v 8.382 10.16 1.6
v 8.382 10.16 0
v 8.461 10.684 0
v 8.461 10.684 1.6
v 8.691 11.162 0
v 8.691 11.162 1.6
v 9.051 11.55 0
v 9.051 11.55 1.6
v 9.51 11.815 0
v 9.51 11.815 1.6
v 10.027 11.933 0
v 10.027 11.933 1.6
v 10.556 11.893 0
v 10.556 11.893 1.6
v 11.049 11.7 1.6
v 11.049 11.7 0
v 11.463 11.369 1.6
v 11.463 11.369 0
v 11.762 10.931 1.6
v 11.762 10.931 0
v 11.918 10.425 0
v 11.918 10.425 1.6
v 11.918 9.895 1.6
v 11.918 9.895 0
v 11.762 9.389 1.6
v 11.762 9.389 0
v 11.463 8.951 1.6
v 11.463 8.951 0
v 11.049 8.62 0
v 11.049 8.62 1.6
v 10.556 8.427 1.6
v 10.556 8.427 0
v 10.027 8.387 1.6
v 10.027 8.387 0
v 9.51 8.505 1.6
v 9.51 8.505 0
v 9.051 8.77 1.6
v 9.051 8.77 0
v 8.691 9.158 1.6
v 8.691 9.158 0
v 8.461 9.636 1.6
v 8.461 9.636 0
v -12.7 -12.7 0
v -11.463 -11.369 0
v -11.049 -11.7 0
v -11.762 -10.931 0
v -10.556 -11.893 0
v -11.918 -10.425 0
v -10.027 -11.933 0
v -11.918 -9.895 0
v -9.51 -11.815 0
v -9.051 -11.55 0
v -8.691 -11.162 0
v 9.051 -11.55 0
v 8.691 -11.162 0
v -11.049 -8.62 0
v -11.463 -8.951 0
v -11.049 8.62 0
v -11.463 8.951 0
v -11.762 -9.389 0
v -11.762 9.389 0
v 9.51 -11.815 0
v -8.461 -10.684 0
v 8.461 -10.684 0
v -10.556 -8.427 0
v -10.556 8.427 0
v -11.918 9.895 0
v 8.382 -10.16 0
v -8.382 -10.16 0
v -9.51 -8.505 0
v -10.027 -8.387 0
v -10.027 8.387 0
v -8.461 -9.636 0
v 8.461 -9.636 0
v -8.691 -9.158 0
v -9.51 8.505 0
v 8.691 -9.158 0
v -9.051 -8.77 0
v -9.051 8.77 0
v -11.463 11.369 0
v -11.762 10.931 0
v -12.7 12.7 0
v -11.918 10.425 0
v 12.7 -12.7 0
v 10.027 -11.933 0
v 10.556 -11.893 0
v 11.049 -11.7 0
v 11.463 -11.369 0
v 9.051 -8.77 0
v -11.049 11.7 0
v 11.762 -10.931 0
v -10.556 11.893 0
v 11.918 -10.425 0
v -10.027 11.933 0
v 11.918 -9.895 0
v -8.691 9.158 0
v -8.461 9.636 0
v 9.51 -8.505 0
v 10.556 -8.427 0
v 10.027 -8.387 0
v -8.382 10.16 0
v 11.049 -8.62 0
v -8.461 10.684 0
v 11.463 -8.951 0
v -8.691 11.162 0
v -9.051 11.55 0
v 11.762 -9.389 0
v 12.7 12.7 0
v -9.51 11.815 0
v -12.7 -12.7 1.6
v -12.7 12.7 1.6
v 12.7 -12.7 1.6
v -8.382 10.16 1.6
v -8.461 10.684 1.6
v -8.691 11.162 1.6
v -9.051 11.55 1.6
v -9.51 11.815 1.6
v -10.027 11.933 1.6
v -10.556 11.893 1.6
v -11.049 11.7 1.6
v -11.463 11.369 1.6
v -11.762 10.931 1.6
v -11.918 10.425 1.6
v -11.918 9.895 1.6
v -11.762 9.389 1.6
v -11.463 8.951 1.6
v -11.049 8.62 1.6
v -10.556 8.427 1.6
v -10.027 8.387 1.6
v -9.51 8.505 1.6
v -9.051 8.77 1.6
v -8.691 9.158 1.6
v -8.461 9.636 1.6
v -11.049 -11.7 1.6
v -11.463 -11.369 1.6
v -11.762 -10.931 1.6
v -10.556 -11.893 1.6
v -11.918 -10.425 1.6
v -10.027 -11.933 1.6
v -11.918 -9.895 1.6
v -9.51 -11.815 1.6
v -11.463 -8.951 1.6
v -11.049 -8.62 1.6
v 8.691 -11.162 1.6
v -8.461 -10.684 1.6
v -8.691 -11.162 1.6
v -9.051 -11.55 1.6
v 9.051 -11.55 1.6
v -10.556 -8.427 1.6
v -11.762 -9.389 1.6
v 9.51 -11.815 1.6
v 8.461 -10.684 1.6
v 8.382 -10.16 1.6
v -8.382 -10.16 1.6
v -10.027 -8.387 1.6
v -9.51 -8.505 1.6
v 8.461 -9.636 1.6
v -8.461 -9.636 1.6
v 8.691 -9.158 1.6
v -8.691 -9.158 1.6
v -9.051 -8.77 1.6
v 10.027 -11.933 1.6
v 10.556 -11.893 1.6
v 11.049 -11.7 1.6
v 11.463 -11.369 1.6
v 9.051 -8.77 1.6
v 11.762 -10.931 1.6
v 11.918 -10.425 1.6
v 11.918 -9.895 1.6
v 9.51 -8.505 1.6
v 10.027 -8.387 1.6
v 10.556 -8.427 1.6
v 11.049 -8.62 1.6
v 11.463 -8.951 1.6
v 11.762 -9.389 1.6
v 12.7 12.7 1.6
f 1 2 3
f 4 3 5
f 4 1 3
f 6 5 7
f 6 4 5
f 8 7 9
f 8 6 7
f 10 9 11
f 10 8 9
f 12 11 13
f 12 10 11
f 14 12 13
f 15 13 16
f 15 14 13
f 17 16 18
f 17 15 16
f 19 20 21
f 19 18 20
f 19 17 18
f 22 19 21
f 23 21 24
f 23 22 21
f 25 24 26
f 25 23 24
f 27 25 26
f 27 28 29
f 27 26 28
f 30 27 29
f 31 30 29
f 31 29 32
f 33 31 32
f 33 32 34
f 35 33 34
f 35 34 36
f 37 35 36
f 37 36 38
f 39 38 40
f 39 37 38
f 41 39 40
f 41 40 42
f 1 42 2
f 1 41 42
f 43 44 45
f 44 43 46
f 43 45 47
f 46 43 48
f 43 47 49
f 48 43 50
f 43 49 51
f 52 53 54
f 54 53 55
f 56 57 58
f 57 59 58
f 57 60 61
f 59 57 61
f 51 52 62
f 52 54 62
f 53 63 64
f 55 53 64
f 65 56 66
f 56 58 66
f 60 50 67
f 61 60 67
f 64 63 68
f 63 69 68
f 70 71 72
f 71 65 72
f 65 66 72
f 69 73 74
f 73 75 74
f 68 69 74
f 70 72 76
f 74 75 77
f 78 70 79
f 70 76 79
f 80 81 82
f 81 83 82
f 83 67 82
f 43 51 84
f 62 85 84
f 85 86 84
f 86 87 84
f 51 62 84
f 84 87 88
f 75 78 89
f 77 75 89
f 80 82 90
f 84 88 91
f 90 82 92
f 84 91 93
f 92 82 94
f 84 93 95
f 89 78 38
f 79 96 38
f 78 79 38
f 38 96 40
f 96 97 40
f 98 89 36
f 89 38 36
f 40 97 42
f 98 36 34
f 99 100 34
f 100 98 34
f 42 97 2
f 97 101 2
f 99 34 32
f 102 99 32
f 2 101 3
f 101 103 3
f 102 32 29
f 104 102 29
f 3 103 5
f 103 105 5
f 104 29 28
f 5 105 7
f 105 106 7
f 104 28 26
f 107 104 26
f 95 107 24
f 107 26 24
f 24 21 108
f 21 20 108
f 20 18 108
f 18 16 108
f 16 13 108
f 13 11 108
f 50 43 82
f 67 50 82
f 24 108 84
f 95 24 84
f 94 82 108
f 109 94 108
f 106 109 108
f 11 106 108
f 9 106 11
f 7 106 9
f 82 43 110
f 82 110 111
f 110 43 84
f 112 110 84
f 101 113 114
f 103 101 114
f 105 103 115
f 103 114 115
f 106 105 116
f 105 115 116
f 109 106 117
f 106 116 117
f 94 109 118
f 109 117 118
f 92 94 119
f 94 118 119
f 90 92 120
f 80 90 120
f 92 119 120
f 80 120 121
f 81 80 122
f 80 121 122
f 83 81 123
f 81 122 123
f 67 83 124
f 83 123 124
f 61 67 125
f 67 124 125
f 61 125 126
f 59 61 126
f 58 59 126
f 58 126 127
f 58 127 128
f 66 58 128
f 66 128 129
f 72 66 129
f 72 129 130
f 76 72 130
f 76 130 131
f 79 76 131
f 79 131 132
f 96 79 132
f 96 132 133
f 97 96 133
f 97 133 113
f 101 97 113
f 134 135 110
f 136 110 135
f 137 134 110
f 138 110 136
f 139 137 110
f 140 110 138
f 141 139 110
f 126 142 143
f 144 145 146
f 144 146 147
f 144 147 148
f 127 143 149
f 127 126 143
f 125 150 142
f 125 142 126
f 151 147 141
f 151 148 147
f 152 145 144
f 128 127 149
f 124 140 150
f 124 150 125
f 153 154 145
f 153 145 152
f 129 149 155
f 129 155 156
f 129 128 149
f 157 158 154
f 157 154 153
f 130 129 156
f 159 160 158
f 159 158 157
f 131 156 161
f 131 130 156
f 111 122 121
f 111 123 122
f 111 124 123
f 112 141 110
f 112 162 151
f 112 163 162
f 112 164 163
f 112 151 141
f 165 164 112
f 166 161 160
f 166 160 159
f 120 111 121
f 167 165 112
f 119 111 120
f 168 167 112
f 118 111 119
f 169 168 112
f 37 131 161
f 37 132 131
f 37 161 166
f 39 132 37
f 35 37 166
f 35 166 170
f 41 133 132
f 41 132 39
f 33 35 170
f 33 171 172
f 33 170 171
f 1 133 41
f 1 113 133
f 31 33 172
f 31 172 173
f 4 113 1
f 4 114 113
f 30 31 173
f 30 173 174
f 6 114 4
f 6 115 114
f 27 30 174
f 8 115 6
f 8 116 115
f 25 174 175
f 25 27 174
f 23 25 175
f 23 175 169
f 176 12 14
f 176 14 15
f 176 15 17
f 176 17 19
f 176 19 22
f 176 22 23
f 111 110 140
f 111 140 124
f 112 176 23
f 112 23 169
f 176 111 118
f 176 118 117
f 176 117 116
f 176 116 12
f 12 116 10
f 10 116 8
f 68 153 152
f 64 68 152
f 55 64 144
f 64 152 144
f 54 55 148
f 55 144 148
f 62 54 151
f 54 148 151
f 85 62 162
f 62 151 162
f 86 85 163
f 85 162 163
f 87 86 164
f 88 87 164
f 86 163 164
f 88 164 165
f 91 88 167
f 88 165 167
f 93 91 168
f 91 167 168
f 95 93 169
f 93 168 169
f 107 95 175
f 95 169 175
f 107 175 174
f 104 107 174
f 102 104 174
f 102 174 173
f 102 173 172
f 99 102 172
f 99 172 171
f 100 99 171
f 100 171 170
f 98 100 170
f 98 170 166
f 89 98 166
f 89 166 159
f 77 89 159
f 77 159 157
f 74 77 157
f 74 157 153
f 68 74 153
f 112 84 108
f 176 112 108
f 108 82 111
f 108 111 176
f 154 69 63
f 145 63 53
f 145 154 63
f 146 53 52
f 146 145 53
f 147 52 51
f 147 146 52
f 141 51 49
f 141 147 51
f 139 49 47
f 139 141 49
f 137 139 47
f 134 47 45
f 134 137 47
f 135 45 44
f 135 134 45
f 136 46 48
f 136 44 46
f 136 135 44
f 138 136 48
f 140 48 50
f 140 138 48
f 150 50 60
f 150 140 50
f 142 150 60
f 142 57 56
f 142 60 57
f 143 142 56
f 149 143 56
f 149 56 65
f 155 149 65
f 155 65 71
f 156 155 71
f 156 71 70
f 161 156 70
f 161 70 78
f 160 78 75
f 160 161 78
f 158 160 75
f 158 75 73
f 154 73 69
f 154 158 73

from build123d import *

# Parameters (mm, degrees)
SKETCH006_W                = 25.4
SKETCH006_H                = 25.4
PAD005_DEPTH               = 1.6
SKETCH005_R                = 1.778
POCKET_DEPTH               = 73.514281
SKETCH005_MIRRORED006_2_R  = 1.778
POCKET_MIRRORED006_2_DEPTH = 73.514281


with BuildPart() as part:
    # Sketch006 → Pad005 (new body)
    with BuildSketch(Plane.XY):
        Rectangle(SKETCH006_W, SKETCH006_H)
    extrude(amount=PAD005_DEPTH)

    # Sketch005 (on Face6 of Pad005) → Pocket (cut, through all)
    with BuildSketch(Plane.XY.offset(1.6)):
        with Locations((-10.16, 10.16)):
            Circle(SKETCH005_R)
    pocket = extrude(amount=-POCKET_DEPTH, mode=Mode.SUBTRACT)

    # Sketch005 Mirrored006 2 → Pocket Mirrored006 2 (cut, through all)
    with BuildSketch(Plane(origin=(0, 0, 1.6), x_dir=(-1, 0, 0), z_dir=(0, 0, -1))):
        with Locations((-10.16, 10.16)):
            Circle(SKETCH005_MIRRORED006_2_R)
    pocket_mirrored006_2 = extrude(amount=POCKET_MIRRORED006_2_DEPTH, mode=Mode.SUBTRACT)

    # Mirrored007: Pocket, Pocket Mirrored006 2 across XZ
    add(pocket.mirror(Plane.XZ), mode=Mode.SUBTRACT)
    add(pocket_mirrored006_2.mirror(Plane.XZ), mode=Mode.SUBTRACT)


solid = part.part
